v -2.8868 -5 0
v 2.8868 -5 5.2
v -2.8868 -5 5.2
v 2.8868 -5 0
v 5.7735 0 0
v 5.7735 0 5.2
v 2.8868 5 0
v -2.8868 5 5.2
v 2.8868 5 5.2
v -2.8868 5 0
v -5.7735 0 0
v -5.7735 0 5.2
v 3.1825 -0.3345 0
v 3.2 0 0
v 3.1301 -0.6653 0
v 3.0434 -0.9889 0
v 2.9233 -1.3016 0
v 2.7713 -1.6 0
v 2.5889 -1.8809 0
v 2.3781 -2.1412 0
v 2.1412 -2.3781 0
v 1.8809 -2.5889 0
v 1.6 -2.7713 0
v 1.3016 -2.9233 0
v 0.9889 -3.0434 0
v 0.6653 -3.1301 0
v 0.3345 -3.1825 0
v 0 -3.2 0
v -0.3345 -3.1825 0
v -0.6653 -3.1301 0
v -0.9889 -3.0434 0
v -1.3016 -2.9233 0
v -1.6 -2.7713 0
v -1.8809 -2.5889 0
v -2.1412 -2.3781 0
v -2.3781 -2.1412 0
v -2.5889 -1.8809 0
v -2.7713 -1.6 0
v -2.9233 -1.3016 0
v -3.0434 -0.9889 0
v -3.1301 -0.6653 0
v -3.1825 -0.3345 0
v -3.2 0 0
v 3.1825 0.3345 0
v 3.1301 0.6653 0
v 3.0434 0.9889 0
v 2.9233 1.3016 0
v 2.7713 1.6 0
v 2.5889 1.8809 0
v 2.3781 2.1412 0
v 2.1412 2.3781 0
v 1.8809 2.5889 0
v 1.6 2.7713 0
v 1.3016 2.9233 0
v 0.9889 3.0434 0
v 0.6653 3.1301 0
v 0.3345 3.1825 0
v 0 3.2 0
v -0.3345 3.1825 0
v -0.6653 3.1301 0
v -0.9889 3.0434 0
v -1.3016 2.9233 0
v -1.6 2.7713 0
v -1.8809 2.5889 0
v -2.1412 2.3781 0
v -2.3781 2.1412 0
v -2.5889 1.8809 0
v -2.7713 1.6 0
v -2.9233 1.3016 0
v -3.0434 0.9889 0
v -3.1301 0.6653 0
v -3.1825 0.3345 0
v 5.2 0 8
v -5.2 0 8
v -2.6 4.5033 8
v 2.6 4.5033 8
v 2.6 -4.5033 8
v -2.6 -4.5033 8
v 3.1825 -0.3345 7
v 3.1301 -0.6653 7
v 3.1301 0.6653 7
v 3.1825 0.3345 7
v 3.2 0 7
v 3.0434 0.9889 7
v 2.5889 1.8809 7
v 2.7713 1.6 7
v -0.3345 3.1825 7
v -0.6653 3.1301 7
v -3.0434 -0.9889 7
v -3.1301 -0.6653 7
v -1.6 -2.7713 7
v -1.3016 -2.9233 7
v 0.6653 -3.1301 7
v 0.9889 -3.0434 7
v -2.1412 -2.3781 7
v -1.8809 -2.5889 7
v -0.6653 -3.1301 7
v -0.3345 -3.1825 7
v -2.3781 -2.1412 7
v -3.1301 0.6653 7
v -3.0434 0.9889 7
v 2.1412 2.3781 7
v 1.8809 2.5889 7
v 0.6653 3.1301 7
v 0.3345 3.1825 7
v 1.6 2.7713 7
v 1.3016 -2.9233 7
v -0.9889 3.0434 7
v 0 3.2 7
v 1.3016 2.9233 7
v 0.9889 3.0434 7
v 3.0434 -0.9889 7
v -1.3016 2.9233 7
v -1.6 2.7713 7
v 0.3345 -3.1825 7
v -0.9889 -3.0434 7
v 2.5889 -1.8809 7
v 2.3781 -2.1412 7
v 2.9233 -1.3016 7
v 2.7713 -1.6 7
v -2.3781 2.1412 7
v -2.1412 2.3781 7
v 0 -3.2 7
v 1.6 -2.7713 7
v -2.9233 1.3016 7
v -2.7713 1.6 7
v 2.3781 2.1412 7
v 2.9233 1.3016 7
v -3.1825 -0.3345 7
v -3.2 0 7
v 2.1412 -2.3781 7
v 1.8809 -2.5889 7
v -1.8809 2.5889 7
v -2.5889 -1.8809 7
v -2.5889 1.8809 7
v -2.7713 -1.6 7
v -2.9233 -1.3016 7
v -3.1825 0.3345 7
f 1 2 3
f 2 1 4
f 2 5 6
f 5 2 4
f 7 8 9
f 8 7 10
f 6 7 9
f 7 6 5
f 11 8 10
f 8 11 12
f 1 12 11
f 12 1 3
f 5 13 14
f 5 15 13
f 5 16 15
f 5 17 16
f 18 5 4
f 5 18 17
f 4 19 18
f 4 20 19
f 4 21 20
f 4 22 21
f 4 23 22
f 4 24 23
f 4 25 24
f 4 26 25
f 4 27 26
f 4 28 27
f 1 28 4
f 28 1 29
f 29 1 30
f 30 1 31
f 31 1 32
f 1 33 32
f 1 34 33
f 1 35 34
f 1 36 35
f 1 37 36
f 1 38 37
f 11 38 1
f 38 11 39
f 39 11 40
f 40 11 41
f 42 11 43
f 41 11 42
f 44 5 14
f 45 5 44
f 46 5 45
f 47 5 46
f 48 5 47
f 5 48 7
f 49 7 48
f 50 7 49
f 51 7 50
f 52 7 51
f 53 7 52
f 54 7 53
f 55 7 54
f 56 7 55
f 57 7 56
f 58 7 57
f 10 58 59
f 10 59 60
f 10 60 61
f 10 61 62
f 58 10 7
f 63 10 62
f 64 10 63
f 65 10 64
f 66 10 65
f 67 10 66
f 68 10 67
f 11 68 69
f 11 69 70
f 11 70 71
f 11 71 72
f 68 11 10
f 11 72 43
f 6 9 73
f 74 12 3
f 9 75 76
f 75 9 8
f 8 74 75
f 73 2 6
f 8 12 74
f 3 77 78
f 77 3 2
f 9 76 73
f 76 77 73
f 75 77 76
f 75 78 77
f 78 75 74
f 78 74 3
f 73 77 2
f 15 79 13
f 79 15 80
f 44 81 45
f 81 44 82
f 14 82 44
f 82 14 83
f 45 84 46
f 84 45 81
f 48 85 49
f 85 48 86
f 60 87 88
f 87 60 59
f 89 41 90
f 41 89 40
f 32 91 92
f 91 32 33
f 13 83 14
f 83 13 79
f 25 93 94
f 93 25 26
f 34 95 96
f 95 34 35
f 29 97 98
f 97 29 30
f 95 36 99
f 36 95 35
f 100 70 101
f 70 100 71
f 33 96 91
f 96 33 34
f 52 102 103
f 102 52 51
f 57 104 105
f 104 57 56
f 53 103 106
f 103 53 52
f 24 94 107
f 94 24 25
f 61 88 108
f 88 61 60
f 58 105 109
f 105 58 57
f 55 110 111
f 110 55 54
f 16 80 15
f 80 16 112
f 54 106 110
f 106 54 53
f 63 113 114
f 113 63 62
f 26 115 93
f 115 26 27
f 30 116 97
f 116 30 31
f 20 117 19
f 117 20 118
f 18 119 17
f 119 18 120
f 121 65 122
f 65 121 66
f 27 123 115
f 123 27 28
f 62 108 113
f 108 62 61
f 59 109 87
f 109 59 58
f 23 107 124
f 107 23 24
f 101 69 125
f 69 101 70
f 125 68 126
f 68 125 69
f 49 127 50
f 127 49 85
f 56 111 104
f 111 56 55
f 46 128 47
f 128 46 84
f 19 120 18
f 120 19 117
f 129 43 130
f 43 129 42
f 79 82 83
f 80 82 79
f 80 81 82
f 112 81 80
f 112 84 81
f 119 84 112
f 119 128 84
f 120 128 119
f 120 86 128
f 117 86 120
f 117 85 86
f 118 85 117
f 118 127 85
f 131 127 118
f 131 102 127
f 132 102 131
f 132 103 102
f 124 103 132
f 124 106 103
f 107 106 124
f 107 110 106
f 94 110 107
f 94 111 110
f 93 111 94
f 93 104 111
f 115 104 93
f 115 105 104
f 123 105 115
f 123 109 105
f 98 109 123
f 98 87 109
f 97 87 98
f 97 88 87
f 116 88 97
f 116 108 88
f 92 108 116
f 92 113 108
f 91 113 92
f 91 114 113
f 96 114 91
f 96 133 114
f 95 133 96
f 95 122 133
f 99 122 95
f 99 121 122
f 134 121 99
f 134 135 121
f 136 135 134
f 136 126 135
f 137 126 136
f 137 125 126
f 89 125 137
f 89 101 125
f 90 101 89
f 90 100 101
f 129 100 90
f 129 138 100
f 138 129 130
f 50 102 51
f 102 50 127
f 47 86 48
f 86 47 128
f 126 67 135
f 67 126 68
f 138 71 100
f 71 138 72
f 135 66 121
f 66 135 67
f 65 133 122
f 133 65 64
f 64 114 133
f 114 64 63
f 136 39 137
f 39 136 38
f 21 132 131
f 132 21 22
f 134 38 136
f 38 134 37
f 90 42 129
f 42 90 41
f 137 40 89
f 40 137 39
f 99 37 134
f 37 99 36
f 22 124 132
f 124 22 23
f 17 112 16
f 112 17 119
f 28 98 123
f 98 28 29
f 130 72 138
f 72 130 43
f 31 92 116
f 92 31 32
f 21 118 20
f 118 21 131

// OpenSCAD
// Blind cap nut.
$fn = 60;
eps = 0.02;
thread_d = 6.4;
flat = 10;
height = 8;
body_h = height*0.65;
difference() {
    union() {
        cylinder(d=flat/cos(30),h=body_h,$fn=6);
        translate([0,0,body_h]) cylinder(d1=flat/cos(30),d2=thread_d+4,h=height-body_h,$fn=6);
    }
    translate([0,0,-eps]) cylinder(d=thread_d,h=height-1+eps);
}
